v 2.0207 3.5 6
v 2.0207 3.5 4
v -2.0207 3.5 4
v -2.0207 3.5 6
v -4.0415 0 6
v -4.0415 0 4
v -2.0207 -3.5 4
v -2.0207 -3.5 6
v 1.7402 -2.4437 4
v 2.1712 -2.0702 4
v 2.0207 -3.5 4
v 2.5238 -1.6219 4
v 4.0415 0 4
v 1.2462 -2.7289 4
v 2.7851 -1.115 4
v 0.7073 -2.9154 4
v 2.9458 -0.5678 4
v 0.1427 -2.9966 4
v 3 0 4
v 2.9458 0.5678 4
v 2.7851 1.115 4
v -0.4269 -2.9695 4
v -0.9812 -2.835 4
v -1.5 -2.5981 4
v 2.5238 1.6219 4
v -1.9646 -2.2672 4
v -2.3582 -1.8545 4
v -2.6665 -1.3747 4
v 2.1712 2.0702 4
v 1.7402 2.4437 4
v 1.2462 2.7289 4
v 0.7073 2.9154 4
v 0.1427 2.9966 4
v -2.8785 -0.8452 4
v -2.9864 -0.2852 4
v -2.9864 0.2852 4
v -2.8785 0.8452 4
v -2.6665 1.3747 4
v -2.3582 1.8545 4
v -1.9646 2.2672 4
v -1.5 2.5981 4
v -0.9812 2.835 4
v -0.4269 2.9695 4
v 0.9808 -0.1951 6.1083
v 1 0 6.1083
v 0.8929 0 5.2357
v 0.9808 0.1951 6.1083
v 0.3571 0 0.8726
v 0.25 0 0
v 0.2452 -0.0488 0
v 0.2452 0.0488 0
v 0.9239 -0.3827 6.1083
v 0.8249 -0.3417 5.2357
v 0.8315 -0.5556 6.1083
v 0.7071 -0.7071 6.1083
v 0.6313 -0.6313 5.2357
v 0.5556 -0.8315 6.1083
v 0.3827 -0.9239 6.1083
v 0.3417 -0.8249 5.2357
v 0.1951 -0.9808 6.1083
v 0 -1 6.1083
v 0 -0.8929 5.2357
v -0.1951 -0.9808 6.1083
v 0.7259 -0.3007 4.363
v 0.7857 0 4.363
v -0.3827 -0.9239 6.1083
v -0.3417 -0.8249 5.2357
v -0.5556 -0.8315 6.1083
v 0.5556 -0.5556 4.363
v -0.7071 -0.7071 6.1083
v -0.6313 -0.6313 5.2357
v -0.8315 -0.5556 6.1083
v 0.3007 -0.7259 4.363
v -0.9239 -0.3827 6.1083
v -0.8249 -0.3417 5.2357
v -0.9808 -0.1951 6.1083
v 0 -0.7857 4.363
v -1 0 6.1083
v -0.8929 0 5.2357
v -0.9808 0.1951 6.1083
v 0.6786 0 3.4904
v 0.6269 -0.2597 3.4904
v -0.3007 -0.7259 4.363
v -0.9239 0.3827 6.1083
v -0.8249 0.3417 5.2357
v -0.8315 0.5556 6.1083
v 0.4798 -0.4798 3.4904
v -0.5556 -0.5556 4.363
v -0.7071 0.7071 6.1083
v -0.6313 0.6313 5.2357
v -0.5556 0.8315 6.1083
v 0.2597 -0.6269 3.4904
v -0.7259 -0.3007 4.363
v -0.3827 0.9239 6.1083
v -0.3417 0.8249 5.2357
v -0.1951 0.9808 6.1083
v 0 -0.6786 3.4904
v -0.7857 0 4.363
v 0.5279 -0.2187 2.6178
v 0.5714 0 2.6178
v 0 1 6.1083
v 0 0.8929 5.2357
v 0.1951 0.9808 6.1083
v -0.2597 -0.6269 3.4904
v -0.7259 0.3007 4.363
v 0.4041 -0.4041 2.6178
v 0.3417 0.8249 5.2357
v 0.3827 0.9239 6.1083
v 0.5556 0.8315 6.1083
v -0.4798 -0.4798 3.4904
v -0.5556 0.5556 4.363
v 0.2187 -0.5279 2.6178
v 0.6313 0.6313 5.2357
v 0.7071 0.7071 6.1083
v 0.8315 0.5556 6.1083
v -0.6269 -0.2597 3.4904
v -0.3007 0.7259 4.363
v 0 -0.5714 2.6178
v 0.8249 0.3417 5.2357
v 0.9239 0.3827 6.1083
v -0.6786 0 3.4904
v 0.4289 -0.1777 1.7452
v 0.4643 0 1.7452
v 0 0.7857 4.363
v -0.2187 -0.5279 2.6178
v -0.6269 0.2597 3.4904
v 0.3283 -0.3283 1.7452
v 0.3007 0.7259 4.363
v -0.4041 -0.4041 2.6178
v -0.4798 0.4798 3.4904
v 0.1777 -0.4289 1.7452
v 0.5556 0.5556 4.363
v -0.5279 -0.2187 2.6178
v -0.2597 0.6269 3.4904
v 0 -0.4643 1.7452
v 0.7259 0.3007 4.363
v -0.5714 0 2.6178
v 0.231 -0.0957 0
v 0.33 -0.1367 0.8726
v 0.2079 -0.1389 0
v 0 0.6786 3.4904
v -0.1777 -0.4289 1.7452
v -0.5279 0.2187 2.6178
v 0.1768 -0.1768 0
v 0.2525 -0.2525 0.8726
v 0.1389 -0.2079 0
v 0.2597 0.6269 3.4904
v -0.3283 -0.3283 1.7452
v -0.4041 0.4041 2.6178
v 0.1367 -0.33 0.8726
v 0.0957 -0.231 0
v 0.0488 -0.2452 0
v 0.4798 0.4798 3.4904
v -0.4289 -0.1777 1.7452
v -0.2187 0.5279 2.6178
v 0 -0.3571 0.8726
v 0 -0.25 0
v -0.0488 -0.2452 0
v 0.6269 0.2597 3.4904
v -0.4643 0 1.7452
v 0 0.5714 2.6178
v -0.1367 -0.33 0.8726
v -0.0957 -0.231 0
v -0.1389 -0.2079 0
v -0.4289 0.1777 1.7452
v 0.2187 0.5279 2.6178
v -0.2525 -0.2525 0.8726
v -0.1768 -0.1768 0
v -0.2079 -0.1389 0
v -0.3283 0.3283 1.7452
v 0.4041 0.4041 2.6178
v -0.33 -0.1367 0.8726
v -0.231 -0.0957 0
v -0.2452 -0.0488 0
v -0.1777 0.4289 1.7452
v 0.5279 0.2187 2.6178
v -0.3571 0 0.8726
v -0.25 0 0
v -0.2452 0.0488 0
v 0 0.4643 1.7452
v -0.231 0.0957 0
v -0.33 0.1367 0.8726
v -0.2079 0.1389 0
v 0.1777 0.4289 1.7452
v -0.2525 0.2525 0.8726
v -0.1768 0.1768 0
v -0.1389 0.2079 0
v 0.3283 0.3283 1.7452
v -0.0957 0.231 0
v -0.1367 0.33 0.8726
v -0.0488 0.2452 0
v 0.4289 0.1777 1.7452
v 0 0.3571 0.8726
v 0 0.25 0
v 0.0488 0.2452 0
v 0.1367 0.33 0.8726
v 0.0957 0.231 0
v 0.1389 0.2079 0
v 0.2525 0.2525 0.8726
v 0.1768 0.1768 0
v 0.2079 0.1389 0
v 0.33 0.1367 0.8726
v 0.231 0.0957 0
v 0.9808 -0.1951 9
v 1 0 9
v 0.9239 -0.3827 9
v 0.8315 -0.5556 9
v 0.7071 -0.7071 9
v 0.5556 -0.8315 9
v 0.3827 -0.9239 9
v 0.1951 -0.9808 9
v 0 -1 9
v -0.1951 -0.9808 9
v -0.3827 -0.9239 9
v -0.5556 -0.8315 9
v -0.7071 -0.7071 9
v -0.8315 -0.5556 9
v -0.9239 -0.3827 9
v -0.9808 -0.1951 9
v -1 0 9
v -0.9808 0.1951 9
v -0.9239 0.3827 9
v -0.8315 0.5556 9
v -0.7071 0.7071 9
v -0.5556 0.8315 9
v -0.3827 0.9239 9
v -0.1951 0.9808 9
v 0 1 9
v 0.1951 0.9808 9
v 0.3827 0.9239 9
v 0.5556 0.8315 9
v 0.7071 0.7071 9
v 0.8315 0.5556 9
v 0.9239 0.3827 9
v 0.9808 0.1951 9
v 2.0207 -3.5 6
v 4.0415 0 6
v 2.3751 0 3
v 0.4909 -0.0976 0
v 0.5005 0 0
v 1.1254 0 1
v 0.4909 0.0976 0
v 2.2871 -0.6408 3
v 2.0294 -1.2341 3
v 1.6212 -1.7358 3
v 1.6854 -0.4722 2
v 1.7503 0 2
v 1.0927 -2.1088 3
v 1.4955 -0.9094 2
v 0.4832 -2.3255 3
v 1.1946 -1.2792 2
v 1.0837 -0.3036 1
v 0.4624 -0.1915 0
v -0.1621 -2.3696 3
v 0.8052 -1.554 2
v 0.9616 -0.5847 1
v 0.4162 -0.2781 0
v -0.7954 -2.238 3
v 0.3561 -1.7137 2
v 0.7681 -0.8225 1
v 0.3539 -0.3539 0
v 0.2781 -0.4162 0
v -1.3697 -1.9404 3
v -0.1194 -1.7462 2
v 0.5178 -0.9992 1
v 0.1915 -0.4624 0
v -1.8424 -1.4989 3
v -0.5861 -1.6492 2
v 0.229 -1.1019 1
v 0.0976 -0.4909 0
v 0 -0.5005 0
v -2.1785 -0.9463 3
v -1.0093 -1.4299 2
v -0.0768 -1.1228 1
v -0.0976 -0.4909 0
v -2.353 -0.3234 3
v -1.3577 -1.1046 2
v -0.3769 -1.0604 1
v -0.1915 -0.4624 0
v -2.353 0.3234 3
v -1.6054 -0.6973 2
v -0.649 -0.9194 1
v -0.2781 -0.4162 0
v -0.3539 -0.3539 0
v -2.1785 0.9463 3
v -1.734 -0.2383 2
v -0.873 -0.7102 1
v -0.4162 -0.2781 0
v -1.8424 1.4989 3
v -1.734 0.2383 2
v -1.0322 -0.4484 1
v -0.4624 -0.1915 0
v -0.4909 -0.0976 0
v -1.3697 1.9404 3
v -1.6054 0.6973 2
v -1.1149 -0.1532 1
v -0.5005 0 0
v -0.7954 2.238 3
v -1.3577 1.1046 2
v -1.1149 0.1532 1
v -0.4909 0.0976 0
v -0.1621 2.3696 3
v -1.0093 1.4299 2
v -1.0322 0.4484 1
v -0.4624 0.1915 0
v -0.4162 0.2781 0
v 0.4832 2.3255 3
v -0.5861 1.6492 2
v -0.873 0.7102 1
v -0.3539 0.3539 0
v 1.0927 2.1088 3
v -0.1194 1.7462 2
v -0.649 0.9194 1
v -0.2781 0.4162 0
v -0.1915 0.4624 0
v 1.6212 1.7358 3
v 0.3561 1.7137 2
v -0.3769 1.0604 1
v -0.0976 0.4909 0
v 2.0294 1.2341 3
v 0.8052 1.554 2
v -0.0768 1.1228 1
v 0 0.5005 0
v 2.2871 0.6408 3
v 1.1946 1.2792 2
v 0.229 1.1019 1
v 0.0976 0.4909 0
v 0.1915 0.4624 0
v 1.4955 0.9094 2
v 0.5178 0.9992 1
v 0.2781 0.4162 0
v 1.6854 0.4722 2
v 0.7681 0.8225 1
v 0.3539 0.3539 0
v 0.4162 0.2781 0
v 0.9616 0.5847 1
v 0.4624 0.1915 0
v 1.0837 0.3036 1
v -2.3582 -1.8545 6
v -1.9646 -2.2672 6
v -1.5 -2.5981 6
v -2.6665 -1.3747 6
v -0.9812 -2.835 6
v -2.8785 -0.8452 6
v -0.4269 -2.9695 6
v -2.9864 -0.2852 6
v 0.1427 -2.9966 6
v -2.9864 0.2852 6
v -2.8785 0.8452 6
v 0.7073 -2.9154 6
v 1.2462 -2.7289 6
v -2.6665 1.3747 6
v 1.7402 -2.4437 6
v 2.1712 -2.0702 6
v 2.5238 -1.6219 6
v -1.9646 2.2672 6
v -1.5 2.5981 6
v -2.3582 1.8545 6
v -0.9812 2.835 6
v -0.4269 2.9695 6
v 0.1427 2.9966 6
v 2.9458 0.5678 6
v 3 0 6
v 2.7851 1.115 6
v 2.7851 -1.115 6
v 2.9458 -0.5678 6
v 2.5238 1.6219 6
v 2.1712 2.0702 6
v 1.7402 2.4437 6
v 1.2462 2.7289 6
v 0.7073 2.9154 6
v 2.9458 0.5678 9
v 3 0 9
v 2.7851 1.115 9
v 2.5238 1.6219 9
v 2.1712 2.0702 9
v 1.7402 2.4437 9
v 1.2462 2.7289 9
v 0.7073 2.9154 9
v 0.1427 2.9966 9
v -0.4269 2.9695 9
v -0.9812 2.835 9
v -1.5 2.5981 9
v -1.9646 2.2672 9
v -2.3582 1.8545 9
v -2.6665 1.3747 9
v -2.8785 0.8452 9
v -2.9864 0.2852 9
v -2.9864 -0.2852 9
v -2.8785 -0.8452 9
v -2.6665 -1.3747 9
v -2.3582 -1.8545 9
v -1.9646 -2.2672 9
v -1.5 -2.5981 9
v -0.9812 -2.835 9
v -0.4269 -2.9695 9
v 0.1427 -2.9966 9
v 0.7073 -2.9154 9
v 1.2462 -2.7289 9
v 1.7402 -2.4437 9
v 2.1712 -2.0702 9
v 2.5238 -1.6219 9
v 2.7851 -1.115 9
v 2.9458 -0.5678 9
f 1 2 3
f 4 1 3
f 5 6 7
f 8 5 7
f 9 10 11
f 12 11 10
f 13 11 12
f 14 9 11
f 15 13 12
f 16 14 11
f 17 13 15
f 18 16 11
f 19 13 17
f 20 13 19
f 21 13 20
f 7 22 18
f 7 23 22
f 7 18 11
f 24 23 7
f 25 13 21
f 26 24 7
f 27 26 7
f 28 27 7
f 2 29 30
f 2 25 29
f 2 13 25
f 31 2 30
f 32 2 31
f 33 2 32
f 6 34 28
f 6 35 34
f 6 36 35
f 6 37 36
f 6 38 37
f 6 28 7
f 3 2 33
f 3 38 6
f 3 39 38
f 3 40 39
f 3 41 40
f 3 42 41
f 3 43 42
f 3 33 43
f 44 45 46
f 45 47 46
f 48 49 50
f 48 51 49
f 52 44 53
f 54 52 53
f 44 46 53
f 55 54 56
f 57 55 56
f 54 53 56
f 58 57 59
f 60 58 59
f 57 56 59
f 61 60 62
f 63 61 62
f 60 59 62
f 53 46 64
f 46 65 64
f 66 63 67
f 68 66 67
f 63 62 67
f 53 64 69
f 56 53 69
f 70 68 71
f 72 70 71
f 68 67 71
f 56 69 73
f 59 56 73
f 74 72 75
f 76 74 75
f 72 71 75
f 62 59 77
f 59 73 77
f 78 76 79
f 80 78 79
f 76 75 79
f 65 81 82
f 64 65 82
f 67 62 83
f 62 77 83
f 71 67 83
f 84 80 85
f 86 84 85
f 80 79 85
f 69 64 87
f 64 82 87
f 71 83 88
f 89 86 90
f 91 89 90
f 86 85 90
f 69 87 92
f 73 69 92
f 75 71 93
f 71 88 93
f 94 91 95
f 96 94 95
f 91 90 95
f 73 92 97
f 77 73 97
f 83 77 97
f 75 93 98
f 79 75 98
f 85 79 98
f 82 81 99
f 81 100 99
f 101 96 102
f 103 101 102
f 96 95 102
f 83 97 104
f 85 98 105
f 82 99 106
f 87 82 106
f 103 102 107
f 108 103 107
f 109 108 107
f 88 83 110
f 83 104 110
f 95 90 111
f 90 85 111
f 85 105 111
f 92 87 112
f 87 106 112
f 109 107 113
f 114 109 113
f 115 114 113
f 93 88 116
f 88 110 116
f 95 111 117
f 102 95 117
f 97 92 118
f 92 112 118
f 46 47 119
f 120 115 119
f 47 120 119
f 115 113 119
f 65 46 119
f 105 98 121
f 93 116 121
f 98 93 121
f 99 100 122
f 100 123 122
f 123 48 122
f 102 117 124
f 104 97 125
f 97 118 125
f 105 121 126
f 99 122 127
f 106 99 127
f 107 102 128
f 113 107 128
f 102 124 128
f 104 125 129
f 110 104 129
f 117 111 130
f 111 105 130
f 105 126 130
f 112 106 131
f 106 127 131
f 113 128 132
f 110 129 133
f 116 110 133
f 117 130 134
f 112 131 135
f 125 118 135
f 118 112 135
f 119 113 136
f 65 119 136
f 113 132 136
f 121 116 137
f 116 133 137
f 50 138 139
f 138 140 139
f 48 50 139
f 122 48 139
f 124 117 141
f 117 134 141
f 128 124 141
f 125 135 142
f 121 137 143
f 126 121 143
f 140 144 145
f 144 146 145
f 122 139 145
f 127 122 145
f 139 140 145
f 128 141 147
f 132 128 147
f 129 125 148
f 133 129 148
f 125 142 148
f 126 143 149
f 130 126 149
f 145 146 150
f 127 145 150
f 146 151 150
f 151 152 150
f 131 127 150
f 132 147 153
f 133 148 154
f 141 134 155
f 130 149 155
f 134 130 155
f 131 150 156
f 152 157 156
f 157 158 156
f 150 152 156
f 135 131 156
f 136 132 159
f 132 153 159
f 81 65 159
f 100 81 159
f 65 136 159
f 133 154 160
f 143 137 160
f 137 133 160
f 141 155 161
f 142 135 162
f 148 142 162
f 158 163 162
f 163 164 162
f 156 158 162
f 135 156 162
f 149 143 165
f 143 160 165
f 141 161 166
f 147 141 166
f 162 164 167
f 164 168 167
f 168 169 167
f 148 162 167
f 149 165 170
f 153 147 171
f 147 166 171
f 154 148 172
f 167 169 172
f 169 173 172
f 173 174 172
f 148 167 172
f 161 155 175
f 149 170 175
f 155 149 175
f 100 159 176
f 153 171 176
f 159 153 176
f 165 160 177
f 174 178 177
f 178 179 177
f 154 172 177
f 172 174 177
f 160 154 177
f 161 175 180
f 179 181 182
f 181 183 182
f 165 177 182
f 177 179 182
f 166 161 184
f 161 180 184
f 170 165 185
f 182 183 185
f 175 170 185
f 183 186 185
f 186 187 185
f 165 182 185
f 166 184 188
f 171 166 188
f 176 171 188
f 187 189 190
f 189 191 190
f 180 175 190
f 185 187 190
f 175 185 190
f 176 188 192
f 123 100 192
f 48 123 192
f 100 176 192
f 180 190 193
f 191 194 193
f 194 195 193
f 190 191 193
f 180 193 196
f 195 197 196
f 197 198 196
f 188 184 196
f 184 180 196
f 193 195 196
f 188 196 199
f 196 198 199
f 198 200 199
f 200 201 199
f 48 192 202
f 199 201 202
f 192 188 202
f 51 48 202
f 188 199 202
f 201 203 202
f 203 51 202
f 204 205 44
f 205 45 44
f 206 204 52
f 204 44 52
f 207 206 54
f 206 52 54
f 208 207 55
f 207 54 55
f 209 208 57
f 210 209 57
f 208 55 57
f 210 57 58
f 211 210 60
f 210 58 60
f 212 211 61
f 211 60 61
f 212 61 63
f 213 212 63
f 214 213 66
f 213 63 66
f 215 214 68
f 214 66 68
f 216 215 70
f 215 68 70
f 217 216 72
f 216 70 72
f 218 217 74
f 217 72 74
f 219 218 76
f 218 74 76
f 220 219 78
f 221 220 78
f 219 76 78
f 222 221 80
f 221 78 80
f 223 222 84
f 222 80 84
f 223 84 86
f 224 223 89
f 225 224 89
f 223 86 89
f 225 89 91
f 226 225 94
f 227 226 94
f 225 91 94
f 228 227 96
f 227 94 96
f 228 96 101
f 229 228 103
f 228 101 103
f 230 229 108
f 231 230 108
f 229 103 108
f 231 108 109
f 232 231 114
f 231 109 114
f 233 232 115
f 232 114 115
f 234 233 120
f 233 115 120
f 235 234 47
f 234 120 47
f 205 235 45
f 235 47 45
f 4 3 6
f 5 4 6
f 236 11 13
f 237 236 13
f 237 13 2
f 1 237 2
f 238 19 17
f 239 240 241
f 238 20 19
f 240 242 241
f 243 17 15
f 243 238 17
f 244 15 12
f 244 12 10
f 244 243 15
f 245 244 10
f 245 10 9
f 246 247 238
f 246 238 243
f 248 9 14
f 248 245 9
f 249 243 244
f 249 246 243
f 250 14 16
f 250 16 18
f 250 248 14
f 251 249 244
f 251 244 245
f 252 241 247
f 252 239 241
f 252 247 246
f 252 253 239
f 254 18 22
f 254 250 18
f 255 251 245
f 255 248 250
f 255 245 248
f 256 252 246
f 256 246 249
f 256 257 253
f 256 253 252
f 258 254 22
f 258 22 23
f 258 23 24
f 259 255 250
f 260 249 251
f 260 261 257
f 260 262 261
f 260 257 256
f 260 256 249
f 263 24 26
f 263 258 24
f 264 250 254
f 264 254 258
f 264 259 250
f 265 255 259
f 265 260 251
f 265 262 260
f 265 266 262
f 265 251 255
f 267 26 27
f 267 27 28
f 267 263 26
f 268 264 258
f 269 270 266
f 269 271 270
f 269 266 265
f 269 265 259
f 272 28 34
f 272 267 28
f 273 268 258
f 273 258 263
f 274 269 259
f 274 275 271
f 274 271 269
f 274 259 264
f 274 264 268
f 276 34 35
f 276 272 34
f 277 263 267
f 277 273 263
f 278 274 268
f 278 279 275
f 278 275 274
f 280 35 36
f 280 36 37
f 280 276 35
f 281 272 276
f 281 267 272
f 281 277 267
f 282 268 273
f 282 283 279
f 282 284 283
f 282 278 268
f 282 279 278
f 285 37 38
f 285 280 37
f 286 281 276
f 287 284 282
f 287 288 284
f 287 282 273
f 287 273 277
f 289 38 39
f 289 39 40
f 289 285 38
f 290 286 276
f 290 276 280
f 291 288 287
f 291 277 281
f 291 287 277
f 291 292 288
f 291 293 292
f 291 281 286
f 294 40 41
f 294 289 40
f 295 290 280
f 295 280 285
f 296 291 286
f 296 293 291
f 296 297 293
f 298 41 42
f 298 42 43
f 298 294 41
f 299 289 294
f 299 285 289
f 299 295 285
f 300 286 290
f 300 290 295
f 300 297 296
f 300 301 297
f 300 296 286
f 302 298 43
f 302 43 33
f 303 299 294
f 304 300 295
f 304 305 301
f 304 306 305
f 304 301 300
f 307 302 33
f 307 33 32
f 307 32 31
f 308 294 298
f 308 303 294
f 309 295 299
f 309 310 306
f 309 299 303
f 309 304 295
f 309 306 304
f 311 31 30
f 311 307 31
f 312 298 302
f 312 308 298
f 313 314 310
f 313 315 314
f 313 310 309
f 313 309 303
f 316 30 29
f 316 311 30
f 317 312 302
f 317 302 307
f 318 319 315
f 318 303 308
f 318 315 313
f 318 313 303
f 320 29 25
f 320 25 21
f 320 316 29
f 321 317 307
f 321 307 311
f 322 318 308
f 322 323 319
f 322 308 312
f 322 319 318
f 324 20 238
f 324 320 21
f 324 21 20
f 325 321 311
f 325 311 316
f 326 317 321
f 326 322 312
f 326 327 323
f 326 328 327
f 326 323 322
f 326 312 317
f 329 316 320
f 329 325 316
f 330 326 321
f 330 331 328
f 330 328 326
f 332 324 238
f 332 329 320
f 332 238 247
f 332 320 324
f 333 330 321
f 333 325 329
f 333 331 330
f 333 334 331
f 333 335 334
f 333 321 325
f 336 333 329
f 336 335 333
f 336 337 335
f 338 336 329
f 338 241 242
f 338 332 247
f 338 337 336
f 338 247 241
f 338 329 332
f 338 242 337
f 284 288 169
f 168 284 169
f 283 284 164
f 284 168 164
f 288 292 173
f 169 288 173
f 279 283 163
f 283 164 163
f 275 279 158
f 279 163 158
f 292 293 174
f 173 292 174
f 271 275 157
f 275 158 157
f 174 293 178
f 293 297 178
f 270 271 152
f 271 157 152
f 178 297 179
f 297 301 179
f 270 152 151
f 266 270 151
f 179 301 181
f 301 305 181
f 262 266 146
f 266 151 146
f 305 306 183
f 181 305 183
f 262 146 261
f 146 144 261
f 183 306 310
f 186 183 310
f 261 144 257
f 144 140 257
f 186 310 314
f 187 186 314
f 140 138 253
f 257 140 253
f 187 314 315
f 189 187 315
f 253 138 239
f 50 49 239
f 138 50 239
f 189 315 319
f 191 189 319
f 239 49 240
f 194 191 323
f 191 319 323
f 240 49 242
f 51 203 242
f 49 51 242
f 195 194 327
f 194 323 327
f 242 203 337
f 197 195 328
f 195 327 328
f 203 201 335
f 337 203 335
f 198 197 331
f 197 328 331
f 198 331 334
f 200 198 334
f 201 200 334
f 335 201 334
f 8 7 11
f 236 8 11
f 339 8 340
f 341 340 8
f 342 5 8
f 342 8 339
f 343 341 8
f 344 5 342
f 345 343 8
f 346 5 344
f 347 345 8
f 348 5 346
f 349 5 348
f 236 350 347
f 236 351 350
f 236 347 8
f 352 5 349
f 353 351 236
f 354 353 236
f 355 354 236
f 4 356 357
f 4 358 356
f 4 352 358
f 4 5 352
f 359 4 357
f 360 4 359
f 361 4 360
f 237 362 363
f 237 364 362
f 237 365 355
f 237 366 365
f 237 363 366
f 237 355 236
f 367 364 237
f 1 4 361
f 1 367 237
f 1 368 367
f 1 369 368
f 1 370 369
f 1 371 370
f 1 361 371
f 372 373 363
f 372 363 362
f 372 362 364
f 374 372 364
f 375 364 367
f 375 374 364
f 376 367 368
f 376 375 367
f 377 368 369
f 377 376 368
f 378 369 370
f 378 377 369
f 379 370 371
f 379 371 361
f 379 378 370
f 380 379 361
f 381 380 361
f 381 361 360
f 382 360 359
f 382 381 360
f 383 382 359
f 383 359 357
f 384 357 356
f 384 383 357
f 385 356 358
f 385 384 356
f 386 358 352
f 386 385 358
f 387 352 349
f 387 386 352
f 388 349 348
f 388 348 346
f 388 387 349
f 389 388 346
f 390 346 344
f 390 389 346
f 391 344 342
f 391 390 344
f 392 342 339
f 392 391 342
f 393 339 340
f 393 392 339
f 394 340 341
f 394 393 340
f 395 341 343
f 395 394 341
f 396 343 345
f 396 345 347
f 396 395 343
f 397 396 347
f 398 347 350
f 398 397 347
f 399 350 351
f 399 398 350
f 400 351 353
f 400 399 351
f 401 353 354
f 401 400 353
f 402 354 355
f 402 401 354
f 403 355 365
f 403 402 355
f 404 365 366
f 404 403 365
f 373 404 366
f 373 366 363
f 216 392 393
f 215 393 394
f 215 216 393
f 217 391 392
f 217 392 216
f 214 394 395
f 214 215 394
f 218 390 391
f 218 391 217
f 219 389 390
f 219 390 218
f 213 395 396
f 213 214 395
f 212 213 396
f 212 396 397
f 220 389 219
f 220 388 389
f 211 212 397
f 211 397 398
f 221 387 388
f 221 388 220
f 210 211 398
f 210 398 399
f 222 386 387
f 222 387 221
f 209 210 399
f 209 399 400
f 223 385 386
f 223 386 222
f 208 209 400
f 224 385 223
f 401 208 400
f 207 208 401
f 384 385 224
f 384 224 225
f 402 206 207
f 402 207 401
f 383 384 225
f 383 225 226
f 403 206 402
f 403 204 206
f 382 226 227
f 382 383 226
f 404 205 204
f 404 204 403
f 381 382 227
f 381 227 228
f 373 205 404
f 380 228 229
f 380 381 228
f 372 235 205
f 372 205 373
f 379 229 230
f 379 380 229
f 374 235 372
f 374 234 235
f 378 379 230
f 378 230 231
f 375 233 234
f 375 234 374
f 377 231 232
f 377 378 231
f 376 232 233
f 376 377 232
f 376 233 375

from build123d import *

# Parameters (mm, degrees)
BOSS_EXTRU_1_DEPTH      = 9
ESQUISSE2_W             = 19.623971562
ESQUISSE2_H             = 15.534154535
ESQUISSE2_R             = 3
ENL_V_MAT_EXTRU_1_DEPTH = 3
ENL_V_START             = -4
ESQUISSE3_W             = 11.267201257
ESQUISSE3_H             = 13.961169169
ESQUISSE3_R             = 3
ENL_V_MAT_EXTRU_2_DEPTH = 4
CHANFREIN1_SIZE         = 4
CHANFREIN1_SIZE_2       = 2.499477408


with BuildPart() as part:
    # Esquisse1 → Boss.-Extru.1 (new body)
    with BuildSketch(Plane.XY):
        Polygon((4.041451884, 0), (2.020725942, 3.5), (-2.020725942, 3.5), (-4.041451884, 0), (-2.020725942, -3.5), (2.020725942, -3.5), align=None)
    extrude(amount=BOSS_EXTRU_1_DEPTH)

    # Esquisse2 → Enlèv. mat.-Extru.1 (cut)
    with BuildSketch(Plane.XY.offset(9)):
        with Locations((0.327116653, -1.544441398)):
            Rectangle(ESQUISSE2_W, ESQUISSE2_H)
        Circle(ESQUISSE2_R, mode=Mode.SUBTRACT)
    extrude(amount=-ENL_V_MAT_EXTRU_1_DEPTH, mode=Mode.SUBTRACT)

    # Esquisse3 → Enlèv. mat.-Extru.2 (cut)
    with BuildSketch(Plane(origin=(0, 0, 0), x_dir=(-1, 0, 0), z_dir=(0, 0, -1)).offset(ENL_V_START)):
        with Locations((0.009770186, 0.039262349)):
            Rectangle(ESQUISSE3_W, ESQUISSE3_H)
        with Locations(Location((0, 0, 0), (0, 0, 180))):
            Circle(ESQUISSE3_R, mode=Mode.SUBTRACT)
    extrude(amount=ENL_V_MAT_EXTRU_2_DEPTH, mode=Mode.SUBTRACT)

    # Chanfrein1
    # the kernel refuses this chamfer: 4, 2.499477408 mm, written as the material it takes off along each edge
    with BuildSketch(Plane(origin=(0, 0, 0), x_dir=(1, 0, 0), z_dir=(0, 1, 0))) as chanfrein1_piece_1_section:
        Polygon((3, -CHANFREIN1_SIZE), (3 - CHANFREIN1_SIZE_2, 0), (3, 0), align=None)
    chanfrein1_piece_1 = revolve(axis=Axis((0, 0, 0), (0, 0, -1)), mode=Mode.PRIVATE)
    chanfrein1_piece_1 = split(chanfrein1_piece_1, bisect_by=Plane(origin=(-1.744026904, 0, 4), z_dir=(0, 0, -1)), keep=Keep.TOP, mode=Mode.PRIVATE)
    add(chanfrein1_piece_1, mode=Mode.SUBTRACT)

    # Esquisse4 → Enlèvement de matière-Révolution1 (revolve, cut)
    with BuildSketch(Plane(origin=(0, 0, 0), x_dir=(1, 0, 0), z_dir=(0, 1, 0))):
        Polygon((0, -9), (1, -9), (1, -6.108259821), (0.25, 0), (0, 0), align=None)
    revolve(axis=Axis((0, 0, 10.381605157), (0, 0, -1)), mode=Mode.SUBTRACT)


solid = part.part
